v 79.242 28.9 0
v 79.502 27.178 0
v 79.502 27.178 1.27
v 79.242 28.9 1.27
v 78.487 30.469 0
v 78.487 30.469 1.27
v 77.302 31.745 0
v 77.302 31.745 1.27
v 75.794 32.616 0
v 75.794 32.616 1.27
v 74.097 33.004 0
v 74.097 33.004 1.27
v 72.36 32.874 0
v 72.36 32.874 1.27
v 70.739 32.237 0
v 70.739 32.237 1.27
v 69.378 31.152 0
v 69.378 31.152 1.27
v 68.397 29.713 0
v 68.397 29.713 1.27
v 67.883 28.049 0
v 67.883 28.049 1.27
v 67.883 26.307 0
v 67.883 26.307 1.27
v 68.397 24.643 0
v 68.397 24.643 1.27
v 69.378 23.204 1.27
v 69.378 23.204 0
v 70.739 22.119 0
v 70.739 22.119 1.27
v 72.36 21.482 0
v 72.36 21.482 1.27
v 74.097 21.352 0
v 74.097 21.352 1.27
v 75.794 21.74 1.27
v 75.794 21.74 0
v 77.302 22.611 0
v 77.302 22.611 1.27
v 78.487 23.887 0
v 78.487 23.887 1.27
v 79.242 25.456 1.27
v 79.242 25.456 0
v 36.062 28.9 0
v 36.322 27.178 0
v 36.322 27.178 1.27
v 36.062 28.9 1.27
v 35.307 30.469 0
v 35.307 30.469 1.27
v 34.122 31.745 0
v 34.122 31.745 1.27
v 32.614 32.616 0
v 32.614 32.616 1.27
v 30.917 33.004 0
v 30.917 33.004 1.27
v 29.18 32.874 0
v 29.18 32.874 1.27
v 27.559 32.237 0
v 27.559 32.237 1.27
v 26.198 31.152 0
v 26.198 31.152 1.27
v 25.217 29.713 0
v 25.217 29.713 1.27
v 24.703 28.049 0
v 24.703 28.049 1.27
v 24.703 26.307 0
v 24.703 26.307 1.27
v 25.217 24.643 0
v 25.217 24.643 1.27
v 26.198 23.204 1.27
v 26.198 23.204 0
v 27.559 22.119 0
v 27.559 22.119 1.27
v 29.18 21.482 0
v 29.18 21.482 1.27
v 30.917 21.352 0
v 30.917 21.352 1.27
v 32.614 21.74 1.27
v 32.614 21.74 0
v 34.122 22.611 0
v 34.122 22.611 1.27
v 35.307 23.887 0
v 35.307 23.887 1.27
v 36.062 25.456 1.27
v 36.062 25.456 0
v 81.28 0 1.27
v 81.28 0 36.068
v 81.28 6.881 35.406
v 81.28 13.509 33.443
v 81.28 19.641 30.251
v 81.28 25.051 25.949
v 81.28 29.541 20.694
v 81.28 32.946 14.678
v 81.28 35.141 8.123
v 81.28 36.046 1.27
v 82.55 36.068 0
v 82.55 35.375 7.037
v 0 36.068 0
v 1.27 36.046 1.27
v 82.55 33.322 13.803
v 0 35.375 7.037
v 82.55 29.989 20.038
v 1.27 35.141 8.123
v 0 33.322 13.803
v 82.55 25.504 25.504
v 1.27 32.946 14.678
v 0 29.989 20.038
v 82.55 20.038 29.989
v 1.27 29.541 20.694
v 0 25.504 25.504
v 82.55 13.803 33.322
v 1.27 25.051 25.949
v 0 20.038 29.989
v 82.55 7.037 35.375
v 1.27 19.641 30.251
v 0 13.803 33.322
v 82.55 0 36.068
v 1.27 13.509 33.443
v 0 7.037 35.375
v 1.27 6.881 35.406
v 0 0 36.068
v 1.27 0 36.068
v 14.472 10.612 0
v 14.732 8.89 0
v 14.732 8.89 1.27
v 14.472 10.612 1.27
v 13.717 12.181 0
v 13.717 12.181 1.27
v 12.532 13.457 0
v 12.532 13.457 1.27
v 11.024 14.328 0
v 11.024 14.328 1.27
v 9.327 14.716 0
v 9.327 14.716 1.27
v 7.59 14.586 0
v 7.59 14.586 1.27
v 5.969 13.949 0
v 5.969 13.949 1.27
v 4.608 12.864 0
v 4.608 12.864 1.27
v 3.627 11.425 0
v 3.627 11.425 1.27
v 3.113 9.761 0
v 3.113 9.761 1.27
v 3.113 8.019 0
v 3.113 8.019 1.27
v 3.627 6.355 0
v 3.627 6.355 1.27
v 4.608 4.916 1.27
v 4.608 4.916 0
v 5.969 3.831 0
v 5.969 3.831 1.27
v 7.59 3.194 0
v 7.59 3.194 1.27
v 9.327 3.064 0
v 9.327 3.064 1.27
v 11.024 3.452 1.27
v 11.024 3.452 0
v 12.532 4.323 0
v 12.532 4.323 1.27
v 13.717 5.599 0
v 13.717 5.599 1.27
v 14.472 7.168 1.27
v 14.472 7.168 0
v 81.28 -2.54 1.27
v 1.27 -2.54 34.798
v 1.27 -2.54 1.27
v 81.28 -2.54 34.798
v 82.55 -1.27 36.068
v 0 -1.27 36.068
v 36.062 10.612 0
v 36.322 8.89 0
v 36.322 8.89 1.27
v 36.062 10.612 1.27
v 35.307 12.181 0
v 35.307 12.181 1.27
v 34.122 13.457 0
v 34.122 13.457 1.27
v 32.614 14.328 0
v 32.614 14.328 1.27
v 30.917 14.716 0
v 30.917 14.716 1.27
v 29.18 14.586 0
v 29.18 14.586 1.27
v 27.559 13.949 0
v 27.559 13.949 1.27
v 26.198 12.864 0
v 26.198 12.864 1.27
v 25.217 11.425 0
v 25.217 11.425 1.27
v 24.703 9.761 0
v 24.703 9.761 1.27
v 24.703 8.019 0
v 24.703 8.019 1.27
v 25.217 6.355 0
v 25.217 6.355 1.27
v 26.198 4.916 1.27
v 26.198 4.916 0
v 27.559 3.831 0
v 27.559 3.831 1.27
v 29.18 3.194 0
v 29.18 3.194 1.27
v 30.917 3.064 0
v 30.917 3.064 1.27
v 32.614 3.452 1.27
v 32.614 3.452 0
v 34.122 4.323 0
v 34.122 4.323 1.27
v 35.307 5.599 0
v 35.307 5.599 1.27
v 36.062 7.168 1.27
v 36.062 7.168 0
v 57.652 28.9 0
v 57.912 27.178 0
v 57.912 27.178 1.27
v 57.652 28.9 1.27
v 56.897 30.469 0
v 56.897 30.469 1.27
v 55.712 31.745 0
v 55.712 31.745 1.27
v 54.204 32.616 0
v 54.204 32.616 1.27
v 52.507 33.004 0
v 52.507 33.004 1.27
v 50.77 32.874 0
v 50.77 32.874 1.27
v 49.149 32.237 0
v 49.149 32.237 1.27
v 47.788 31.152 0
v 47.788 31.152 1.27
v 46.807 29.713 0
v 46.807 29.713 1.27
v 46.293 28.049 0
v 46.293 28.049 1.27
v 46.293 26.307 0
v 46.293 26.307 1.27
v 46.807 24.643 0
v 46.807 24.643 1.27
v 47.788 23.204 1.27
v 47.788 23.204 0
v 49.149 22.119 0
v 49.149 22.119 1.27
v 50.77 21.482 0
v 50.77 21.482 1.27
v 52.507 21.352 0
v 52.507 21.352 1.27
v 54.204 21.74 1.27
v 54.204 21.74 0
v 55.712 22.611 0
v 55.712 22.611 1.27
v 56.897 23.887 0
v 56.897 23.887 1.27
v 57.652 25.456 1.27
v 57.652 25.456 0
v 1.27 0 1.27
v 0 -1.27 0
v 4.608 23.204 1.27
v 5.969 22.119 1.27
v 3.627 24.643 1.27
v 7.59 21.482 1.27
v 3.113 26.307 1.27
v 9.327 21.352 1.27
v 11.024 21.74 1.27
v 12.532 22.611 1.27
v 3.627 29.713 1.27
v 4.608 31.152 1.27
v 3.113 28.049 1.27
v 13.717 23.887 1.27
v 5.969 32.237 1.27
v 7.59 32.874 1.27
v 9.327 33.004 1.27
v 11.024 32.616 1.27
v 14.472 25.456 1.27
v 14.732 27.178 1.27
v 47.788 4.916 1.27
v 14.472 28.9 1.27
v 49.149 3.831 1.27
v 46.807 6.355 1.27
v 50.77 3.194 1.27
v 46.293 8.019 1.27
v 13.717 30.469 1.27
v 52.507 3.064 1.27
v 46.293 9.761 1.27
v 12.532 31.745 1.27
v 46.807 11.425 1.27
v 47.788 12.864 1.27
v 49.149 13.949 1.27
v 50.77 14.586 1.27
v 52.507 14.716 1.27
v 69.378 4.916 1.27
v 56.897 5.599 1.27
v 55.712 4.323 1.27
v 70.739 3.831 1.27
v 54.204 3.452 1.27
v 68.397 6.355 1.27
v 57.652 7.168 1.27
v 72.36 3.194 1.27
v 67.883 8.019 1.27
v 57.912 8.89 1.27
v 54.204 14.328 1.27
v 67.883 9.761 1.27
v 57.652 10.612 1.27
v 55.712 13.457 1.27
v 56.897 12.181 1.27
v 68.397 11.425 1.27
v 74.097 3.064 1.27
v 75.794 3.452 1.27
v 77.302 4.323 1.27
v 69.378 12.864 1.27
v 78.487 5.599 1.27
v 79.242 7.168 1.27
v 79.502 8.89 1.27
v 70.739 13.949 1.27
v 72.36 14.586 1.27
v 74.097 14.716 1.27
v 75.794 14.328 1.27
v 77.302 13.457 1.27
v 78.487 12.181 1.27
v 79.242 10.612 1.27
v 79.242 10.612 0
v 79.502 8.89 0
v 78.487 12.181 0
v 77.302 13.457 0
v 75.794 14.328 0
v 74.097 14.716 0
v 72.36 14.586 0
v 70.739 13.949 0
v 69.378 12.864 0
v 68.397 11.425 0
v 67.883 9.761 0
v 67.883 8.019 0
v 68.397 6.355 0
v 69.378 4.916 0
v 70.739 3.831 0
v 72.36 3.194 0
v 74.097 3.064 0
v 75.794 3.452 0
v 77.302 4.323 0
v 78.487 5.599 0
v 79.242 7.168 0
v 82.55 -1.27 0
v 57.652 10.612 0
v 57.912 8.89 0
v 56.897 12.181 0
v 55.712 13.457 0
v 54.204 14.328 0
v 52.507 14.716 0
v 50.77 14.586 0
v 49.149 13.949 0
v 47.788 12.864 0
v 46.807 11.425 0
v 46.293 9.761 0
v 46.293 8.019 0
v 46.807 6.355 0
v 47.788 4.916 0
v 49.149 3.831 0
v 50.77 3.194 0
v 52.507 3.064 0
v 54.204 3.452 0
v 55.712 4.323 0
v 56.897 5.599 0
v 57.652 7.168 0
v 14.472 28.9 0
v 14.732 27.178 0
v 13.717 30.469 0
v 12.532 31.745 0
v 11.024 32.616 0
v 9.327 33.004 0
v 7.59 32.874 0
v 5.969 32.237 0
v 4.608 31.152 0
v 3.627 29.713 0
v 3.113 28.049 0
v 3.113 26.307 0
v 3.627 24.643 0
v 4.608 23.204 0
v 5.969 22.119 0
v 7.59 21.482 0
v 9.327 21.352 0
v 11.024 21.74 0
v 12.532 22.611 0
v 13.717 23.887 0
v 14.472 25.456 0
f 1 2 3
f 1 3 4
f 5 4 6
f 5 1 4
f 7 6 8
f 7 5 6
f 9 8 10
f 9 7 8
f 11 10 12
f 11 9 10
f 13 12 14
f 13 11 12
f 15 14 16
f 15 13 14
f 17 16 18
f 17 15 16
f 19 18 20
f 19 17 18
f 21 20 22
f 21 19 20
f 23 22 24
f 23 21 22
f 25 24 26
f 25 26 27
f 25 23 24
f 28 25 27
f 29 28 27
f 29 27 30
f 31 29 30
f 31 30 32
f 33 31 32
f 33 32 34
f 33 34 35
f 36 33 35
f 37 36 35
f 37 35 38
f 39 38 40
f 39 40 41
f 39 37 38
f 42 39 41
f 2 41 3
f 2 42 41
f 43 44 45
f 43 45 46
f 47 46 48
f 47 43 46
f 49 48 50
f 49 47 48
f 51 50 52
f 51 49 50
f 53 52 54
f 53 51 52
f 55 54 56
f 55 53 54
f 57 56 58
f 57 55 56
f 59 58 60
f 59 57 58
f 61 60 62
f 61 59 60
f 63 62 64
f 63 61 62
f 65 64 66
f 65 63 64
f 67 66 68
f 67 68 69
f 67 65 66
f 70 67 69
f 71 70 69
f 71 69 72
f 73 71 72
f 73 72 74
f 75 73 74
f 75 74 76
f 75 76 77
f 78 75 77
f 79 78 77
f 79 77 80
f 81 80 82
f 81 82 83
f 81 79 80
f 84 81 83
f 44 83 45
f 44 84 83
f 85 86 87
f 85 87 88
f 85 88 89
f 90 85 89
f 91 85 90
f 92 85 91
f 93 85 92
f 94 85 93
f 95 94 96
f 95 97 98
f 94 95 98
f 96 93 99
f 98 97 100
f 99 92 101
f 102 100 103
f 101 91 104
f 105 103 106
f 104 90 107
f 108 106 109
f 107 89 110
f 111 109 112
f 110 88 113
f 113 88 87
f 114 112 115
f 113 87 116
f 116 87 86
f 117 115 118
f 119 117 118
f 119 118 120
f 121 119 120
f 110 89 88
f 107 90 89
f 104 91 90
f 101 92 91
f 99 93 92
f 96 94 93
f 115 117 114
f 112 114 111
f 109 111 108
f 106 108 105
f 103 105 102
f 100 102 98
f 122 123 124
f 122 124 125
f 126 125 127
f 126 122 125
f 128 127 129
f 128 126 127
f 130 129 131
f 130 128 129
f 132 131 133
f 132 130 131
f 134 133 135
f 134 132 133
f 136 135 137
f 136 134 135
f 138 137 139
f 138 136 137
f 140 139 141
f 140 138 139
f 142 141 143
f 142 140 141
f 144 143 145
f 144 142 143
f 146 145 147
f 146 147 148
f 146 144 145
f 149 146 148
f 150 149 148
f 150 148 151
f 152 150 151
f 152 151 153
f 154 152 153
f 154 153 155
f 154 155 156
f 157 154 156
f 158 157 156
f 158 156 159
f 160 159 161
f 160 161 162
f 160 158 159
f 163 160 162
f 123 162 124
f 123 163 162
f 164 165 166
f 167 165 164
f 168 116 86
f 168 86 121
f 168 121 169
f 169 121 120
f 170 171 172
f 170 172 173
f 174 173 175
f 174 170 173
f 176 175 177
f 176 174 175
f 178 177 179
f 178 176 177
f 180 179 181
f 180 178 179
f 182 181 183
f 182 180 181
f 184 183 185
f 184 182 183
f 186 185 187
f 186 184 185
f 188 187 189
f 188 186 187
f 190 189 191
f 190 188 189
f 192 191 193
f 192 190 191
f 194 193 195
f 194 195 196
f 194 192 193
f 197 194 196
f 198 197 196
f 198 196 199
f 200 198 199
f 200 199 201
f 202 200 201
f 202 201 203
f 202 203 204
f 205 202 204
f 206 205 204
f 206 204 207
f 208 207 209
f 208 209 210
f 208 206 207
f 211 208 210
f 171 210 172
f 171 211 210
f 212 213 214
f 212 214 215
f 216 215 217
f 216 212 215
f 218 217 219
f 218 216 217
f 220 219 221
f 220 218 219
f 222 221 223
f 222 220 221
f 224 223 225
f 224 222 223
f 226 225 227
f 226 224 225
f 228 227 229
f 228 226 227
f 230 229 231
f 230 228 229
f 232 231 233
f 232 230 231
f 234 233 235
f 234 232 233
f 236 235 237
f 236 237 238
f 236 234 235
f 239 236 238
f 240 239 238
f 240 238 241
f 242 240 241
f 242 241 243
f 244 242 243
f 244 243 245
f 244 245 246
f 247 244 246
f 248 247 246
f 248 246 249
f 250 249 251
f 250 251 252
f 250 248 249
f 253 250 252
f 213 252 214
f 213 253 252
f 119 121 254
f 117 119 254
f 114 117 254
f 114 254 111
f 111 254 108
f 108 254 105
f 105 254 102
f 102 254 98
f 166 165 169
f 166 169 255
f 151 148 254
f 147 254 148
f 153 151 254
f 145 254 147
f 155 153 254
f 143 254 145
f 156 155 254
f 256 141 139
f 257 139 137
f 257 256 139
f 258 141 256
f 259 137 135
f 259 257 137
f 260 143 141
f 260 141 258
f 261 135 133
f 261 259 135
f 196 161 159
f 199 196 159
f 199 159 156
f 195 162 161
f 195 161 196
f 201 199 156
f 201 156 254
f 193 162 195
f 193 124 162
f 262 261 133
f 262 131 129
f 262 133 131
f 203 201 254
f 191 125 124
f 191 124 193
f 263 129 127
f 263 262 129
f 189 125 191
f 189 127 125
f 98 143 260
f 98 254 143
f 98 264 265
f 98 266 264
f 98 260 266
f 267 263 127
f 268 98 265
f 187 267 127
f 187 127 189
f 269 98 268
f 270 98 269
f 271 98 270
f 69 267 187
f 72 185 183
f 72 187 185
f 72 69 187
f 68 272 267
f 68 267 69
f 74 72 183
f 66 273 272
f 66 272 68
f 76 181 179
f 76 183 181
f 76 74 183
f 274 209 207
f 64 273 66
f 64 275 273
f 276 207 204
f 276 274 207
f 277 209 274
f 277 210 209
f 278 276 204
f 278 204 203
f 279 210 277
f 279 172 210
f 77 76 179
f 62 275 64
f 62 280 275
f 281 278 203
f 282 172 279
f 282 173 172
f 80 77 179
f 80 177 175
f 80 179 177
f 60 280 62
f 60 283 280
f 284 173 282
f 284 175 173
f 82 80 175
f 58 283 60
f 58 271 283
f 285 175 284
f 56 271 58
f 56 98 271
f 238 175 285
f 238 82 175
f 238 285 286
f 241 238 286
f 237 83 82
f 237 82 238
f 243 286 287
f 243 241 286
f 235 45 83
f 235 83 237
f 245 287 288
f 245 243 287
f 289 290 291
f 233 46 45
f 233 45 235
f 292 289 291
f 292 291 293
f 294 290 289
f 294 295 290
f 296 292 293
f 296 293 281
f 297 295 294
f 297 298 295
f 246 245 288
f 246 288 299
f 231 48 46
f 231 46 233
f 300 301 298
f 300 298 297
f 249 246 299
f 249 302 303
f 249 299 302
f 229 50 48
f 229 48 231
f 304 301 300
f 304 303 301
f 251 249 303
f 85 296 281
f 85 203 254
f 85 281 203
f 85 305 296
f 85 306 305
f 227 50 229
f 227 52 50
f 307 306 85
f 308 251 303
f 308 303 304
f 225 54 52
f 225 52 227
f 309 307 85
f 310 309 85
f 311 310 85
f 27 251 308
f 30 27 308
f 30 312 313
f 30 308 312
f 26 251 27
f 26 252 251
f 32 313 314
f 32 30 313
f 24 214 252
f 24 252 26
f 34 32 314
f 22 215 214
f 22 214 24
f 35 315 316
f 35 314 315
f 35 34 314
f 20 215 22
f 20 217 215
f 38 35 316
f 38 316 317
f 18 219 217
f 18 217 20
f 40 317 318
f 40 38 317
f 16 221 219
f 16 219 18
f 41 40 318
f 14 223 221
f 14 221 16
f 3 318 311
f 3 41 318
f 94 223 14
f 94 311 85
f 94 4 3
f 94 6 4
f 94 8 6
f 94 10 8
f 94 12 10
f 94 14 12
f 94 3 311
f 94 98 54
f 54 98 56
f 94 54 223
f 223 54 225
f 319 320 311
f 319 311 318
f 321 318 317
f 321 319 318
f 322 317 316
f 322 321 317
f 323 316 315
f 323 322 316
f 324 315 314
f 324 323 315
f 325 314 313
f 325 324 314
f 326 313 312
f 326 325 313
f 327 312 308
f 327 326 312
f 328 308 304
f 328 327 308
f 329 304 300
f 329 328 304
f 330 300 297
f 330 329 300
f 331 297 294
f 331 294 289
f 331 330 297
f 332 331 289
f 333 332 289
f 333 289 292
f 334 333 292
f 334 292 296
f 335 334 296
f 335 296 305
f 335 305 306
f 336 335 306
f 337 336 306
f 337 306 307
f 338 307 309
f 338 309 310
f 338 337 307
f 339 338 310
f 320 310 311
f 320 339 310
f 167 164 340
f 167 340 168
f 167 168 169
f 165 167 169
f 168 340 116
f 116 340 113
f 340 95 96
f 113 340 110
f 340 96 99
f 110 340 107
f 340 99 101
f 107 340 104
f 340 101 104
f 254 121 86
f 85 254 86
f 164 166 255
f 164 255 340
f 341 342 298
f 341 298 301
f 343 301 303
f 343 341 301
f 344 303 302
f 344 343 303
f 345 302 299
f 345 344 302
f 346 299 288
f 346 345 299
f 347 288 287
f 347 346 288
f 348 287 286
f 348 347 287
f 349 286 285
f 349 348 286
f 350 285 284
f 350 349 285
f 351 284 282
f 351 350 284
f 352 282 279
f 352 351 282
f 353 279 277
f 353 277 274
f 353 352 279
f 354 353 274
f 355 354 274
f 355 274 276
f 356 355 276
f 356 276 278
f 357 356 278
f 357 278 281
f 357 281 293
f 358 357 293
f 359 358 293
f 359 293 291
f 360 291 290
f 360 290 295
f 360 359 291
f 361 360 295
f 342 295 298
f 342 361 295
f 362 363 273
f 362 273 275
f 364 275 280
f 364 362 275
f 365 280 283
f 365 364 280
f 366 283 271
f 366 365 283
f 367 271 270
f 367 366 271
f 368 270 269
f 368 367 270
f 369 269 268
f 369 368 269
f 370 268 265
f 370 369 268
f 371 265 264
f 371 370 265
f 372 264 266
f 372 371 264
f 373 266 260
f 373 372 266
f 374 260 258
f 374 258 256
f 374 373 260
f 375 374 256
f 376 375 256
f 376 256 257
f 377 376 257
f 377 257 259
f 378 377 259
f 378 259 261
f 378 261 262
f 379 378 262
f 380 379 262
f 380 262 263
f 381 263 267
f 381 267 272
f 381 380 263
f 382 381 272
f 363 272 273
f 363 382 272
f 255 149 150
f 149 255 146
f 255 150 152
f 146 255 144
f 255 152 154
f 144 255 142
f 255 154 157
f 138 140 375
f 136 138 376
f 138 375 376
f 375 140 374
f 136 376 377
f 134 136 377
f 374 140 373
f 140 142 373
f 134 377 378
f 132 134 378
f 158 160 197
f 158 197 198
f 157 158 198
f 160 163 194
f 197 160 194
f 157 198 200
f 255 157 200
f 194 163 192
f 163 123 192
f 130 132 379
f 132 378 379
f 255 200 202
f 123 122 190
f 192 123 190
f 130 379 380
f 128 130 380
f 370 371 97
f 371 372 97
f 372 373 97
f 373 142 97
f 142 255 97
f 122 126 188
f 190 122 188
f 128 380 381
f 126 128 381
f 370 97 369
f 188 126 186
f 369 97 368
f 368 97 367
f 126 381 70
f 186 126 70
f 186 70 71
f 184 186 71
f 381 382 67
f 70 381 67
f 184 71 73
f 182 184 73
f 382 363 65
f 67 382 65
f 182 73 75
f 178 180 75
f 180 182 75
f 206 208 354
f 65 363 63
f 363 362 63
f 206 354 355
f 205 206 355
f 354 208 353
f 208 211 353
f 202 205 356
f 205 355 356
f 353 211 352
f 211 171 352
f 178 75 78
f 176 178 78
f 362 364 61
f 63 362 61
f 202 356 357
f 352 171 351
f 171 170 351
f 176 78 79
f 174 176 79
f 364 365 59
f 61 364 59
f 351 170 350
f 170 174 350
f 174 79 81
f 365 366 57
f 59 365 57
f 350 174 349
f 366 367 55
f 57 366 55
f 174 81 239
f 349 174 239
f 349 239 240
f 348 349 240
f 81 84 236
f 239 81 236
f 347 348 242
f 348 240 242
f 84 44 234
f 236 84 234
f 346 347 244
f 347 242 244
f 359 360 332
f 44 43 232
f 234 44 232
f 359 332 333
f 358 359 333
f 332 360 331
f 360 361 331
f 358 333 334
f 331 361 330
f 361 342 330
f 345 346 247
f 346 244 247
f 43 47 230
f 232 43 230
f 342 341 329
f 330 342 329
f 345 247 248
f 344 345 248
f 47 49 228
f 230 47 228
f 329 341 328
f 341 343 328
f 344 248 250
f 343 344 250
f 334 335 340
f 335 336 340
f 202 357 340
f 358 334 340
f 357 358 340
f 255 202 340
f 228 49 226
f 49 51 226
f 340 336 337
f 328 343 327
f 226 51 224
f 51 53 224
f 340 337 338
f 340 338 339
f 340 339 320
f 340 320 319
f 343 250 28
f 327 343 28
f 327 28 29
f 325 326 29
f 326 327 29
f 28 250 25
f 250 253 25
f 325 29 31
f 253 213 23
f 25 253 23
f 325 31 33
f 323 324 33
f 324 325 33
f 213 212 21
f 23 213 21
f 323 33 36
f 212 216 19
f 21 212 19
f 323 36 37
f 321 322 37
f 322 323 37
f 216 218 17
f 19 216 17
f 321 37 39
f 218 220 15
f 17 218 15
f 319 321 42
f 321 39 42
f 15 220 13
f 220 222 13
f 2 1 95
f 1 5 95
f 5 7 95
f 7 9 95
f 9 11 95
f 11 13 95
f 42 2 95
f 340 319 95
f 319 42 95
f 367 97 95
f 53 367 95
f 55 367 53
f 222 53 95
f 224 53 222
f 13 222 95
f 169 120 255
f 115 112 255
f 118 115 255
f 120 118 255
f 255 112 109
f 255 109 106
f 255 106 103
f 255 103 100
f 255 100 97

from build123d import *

# Parameters (mm, degrees)
F0_W     = 82.55
F0_H     = 36.068
F0_R     = 5.842
F1_DEPTH = 1.27
F2_W     = 1.27
F2_H     = 36.068
F3_DEPTH = 50.8
F5_DEPTH = 101.6
F6_W     = 80.01
F6_H     = 34.798
F7_DEPTH = 2.54
F9_SIZE  = 1.27


with BuildPart() as f1:
    # F0 (on Top) → F1 (new body)
    with BuildSketch(Plane.XY):
        with Locations((41.275, 18.034)):
            Rectangle(F0_W, F0_H)
        with Locations((8.89, 8.89)):
            Circle(F0_R, mode=Mode.SUBTRACT)
        with Locations((30.48, 8.89)):
            Circle(F0_R, mode=Mode.SUBTRACT)
        with Locations((52.07, 8.89)):
            Circle(F0_R, mode=Mode.SUBTRACT)
        with Locations((73.66, 8.89)):
            Circle(F0_R, mode=Mode.SUBTRACT)
        with Locations((8.89, 27.178)):
            Circle(F0_R, mode=Mode.SUBTRACT)
        with Locations((30.48, 27.178)):
            Circle(F0_R, mode=Mode.SUBTRACT)
        with Locations((52.07, 27.178)):
            Circle(F0_R, mode=Mode.SUBTRACT)
        with Locations((73.66, 27.178)):
            Circle(F0_R, mode=Mode.SUBTRACT)
    extrude(amount=F1_DEPTH)

    # F2 (on face) → F3 (join)
    with BuildSketch(Plane.XY.offset(1.27)):
        with Locations((0.635, 18.034)):
            Rectangle(F2_W, F2_H)
        with Locations((81.915, 18.034)):
            Rectangle(F2_W, F2_H)
    extrude(amount=F3_DEPTH)

    # F4 (on face) → F5 (cut)
    with BuildSketch(Plane(origin=(0, 0, 0), x_dir=(0, -1, 0), z_dir=(-1, 0, 0))):
        with BuildLine():
            Line((-36.068, 52.07), (-36.068, 0))
            ThreePointArc((-36.068, 0), (-25.5039273838, 25.5039273838), (0, 36.068))
            Line((0, 36.068), (0, 52.07))
            Line((0, 52.07), (-36.068, 52.07))
        make_face()
    extrude(amount=-F5_DEPTH, mode=Mode.SUBTRACT)


with BuildPart() as f7:
    # F6 (on face) → F7 (new body)
    with BuildSketch(Plane.XZ):
        with Locations((41.275, 18.669)):
            Rectangle(F6_W, F6_H)
        Polygon((0, 36.068), (0, 0), (82.55, 0), (82.55, 36.068), (81.28, 36.068), (81.28, 1.27), (1.27, 1.27), (1.27, 36.068), align=None)
    extrude(amount=F7_DEPTH)


with BuildPart() as f1_1:
    add(f1.part)

    # F8: union F7
    add(f7.part)

    # F9
    f9_edges = [f1_1.edges().sort_by_distance(p)[0] for p in [
        (82.55, -2.54, 18.034),
        (41.275, -2.54, 36.068),
        (41.275, -2.54, 0),
        (0, -2.54, 18.034),
    ]]
    chamfer(f9_edges, length=F9_SIZE)


solid = f1_1.part
